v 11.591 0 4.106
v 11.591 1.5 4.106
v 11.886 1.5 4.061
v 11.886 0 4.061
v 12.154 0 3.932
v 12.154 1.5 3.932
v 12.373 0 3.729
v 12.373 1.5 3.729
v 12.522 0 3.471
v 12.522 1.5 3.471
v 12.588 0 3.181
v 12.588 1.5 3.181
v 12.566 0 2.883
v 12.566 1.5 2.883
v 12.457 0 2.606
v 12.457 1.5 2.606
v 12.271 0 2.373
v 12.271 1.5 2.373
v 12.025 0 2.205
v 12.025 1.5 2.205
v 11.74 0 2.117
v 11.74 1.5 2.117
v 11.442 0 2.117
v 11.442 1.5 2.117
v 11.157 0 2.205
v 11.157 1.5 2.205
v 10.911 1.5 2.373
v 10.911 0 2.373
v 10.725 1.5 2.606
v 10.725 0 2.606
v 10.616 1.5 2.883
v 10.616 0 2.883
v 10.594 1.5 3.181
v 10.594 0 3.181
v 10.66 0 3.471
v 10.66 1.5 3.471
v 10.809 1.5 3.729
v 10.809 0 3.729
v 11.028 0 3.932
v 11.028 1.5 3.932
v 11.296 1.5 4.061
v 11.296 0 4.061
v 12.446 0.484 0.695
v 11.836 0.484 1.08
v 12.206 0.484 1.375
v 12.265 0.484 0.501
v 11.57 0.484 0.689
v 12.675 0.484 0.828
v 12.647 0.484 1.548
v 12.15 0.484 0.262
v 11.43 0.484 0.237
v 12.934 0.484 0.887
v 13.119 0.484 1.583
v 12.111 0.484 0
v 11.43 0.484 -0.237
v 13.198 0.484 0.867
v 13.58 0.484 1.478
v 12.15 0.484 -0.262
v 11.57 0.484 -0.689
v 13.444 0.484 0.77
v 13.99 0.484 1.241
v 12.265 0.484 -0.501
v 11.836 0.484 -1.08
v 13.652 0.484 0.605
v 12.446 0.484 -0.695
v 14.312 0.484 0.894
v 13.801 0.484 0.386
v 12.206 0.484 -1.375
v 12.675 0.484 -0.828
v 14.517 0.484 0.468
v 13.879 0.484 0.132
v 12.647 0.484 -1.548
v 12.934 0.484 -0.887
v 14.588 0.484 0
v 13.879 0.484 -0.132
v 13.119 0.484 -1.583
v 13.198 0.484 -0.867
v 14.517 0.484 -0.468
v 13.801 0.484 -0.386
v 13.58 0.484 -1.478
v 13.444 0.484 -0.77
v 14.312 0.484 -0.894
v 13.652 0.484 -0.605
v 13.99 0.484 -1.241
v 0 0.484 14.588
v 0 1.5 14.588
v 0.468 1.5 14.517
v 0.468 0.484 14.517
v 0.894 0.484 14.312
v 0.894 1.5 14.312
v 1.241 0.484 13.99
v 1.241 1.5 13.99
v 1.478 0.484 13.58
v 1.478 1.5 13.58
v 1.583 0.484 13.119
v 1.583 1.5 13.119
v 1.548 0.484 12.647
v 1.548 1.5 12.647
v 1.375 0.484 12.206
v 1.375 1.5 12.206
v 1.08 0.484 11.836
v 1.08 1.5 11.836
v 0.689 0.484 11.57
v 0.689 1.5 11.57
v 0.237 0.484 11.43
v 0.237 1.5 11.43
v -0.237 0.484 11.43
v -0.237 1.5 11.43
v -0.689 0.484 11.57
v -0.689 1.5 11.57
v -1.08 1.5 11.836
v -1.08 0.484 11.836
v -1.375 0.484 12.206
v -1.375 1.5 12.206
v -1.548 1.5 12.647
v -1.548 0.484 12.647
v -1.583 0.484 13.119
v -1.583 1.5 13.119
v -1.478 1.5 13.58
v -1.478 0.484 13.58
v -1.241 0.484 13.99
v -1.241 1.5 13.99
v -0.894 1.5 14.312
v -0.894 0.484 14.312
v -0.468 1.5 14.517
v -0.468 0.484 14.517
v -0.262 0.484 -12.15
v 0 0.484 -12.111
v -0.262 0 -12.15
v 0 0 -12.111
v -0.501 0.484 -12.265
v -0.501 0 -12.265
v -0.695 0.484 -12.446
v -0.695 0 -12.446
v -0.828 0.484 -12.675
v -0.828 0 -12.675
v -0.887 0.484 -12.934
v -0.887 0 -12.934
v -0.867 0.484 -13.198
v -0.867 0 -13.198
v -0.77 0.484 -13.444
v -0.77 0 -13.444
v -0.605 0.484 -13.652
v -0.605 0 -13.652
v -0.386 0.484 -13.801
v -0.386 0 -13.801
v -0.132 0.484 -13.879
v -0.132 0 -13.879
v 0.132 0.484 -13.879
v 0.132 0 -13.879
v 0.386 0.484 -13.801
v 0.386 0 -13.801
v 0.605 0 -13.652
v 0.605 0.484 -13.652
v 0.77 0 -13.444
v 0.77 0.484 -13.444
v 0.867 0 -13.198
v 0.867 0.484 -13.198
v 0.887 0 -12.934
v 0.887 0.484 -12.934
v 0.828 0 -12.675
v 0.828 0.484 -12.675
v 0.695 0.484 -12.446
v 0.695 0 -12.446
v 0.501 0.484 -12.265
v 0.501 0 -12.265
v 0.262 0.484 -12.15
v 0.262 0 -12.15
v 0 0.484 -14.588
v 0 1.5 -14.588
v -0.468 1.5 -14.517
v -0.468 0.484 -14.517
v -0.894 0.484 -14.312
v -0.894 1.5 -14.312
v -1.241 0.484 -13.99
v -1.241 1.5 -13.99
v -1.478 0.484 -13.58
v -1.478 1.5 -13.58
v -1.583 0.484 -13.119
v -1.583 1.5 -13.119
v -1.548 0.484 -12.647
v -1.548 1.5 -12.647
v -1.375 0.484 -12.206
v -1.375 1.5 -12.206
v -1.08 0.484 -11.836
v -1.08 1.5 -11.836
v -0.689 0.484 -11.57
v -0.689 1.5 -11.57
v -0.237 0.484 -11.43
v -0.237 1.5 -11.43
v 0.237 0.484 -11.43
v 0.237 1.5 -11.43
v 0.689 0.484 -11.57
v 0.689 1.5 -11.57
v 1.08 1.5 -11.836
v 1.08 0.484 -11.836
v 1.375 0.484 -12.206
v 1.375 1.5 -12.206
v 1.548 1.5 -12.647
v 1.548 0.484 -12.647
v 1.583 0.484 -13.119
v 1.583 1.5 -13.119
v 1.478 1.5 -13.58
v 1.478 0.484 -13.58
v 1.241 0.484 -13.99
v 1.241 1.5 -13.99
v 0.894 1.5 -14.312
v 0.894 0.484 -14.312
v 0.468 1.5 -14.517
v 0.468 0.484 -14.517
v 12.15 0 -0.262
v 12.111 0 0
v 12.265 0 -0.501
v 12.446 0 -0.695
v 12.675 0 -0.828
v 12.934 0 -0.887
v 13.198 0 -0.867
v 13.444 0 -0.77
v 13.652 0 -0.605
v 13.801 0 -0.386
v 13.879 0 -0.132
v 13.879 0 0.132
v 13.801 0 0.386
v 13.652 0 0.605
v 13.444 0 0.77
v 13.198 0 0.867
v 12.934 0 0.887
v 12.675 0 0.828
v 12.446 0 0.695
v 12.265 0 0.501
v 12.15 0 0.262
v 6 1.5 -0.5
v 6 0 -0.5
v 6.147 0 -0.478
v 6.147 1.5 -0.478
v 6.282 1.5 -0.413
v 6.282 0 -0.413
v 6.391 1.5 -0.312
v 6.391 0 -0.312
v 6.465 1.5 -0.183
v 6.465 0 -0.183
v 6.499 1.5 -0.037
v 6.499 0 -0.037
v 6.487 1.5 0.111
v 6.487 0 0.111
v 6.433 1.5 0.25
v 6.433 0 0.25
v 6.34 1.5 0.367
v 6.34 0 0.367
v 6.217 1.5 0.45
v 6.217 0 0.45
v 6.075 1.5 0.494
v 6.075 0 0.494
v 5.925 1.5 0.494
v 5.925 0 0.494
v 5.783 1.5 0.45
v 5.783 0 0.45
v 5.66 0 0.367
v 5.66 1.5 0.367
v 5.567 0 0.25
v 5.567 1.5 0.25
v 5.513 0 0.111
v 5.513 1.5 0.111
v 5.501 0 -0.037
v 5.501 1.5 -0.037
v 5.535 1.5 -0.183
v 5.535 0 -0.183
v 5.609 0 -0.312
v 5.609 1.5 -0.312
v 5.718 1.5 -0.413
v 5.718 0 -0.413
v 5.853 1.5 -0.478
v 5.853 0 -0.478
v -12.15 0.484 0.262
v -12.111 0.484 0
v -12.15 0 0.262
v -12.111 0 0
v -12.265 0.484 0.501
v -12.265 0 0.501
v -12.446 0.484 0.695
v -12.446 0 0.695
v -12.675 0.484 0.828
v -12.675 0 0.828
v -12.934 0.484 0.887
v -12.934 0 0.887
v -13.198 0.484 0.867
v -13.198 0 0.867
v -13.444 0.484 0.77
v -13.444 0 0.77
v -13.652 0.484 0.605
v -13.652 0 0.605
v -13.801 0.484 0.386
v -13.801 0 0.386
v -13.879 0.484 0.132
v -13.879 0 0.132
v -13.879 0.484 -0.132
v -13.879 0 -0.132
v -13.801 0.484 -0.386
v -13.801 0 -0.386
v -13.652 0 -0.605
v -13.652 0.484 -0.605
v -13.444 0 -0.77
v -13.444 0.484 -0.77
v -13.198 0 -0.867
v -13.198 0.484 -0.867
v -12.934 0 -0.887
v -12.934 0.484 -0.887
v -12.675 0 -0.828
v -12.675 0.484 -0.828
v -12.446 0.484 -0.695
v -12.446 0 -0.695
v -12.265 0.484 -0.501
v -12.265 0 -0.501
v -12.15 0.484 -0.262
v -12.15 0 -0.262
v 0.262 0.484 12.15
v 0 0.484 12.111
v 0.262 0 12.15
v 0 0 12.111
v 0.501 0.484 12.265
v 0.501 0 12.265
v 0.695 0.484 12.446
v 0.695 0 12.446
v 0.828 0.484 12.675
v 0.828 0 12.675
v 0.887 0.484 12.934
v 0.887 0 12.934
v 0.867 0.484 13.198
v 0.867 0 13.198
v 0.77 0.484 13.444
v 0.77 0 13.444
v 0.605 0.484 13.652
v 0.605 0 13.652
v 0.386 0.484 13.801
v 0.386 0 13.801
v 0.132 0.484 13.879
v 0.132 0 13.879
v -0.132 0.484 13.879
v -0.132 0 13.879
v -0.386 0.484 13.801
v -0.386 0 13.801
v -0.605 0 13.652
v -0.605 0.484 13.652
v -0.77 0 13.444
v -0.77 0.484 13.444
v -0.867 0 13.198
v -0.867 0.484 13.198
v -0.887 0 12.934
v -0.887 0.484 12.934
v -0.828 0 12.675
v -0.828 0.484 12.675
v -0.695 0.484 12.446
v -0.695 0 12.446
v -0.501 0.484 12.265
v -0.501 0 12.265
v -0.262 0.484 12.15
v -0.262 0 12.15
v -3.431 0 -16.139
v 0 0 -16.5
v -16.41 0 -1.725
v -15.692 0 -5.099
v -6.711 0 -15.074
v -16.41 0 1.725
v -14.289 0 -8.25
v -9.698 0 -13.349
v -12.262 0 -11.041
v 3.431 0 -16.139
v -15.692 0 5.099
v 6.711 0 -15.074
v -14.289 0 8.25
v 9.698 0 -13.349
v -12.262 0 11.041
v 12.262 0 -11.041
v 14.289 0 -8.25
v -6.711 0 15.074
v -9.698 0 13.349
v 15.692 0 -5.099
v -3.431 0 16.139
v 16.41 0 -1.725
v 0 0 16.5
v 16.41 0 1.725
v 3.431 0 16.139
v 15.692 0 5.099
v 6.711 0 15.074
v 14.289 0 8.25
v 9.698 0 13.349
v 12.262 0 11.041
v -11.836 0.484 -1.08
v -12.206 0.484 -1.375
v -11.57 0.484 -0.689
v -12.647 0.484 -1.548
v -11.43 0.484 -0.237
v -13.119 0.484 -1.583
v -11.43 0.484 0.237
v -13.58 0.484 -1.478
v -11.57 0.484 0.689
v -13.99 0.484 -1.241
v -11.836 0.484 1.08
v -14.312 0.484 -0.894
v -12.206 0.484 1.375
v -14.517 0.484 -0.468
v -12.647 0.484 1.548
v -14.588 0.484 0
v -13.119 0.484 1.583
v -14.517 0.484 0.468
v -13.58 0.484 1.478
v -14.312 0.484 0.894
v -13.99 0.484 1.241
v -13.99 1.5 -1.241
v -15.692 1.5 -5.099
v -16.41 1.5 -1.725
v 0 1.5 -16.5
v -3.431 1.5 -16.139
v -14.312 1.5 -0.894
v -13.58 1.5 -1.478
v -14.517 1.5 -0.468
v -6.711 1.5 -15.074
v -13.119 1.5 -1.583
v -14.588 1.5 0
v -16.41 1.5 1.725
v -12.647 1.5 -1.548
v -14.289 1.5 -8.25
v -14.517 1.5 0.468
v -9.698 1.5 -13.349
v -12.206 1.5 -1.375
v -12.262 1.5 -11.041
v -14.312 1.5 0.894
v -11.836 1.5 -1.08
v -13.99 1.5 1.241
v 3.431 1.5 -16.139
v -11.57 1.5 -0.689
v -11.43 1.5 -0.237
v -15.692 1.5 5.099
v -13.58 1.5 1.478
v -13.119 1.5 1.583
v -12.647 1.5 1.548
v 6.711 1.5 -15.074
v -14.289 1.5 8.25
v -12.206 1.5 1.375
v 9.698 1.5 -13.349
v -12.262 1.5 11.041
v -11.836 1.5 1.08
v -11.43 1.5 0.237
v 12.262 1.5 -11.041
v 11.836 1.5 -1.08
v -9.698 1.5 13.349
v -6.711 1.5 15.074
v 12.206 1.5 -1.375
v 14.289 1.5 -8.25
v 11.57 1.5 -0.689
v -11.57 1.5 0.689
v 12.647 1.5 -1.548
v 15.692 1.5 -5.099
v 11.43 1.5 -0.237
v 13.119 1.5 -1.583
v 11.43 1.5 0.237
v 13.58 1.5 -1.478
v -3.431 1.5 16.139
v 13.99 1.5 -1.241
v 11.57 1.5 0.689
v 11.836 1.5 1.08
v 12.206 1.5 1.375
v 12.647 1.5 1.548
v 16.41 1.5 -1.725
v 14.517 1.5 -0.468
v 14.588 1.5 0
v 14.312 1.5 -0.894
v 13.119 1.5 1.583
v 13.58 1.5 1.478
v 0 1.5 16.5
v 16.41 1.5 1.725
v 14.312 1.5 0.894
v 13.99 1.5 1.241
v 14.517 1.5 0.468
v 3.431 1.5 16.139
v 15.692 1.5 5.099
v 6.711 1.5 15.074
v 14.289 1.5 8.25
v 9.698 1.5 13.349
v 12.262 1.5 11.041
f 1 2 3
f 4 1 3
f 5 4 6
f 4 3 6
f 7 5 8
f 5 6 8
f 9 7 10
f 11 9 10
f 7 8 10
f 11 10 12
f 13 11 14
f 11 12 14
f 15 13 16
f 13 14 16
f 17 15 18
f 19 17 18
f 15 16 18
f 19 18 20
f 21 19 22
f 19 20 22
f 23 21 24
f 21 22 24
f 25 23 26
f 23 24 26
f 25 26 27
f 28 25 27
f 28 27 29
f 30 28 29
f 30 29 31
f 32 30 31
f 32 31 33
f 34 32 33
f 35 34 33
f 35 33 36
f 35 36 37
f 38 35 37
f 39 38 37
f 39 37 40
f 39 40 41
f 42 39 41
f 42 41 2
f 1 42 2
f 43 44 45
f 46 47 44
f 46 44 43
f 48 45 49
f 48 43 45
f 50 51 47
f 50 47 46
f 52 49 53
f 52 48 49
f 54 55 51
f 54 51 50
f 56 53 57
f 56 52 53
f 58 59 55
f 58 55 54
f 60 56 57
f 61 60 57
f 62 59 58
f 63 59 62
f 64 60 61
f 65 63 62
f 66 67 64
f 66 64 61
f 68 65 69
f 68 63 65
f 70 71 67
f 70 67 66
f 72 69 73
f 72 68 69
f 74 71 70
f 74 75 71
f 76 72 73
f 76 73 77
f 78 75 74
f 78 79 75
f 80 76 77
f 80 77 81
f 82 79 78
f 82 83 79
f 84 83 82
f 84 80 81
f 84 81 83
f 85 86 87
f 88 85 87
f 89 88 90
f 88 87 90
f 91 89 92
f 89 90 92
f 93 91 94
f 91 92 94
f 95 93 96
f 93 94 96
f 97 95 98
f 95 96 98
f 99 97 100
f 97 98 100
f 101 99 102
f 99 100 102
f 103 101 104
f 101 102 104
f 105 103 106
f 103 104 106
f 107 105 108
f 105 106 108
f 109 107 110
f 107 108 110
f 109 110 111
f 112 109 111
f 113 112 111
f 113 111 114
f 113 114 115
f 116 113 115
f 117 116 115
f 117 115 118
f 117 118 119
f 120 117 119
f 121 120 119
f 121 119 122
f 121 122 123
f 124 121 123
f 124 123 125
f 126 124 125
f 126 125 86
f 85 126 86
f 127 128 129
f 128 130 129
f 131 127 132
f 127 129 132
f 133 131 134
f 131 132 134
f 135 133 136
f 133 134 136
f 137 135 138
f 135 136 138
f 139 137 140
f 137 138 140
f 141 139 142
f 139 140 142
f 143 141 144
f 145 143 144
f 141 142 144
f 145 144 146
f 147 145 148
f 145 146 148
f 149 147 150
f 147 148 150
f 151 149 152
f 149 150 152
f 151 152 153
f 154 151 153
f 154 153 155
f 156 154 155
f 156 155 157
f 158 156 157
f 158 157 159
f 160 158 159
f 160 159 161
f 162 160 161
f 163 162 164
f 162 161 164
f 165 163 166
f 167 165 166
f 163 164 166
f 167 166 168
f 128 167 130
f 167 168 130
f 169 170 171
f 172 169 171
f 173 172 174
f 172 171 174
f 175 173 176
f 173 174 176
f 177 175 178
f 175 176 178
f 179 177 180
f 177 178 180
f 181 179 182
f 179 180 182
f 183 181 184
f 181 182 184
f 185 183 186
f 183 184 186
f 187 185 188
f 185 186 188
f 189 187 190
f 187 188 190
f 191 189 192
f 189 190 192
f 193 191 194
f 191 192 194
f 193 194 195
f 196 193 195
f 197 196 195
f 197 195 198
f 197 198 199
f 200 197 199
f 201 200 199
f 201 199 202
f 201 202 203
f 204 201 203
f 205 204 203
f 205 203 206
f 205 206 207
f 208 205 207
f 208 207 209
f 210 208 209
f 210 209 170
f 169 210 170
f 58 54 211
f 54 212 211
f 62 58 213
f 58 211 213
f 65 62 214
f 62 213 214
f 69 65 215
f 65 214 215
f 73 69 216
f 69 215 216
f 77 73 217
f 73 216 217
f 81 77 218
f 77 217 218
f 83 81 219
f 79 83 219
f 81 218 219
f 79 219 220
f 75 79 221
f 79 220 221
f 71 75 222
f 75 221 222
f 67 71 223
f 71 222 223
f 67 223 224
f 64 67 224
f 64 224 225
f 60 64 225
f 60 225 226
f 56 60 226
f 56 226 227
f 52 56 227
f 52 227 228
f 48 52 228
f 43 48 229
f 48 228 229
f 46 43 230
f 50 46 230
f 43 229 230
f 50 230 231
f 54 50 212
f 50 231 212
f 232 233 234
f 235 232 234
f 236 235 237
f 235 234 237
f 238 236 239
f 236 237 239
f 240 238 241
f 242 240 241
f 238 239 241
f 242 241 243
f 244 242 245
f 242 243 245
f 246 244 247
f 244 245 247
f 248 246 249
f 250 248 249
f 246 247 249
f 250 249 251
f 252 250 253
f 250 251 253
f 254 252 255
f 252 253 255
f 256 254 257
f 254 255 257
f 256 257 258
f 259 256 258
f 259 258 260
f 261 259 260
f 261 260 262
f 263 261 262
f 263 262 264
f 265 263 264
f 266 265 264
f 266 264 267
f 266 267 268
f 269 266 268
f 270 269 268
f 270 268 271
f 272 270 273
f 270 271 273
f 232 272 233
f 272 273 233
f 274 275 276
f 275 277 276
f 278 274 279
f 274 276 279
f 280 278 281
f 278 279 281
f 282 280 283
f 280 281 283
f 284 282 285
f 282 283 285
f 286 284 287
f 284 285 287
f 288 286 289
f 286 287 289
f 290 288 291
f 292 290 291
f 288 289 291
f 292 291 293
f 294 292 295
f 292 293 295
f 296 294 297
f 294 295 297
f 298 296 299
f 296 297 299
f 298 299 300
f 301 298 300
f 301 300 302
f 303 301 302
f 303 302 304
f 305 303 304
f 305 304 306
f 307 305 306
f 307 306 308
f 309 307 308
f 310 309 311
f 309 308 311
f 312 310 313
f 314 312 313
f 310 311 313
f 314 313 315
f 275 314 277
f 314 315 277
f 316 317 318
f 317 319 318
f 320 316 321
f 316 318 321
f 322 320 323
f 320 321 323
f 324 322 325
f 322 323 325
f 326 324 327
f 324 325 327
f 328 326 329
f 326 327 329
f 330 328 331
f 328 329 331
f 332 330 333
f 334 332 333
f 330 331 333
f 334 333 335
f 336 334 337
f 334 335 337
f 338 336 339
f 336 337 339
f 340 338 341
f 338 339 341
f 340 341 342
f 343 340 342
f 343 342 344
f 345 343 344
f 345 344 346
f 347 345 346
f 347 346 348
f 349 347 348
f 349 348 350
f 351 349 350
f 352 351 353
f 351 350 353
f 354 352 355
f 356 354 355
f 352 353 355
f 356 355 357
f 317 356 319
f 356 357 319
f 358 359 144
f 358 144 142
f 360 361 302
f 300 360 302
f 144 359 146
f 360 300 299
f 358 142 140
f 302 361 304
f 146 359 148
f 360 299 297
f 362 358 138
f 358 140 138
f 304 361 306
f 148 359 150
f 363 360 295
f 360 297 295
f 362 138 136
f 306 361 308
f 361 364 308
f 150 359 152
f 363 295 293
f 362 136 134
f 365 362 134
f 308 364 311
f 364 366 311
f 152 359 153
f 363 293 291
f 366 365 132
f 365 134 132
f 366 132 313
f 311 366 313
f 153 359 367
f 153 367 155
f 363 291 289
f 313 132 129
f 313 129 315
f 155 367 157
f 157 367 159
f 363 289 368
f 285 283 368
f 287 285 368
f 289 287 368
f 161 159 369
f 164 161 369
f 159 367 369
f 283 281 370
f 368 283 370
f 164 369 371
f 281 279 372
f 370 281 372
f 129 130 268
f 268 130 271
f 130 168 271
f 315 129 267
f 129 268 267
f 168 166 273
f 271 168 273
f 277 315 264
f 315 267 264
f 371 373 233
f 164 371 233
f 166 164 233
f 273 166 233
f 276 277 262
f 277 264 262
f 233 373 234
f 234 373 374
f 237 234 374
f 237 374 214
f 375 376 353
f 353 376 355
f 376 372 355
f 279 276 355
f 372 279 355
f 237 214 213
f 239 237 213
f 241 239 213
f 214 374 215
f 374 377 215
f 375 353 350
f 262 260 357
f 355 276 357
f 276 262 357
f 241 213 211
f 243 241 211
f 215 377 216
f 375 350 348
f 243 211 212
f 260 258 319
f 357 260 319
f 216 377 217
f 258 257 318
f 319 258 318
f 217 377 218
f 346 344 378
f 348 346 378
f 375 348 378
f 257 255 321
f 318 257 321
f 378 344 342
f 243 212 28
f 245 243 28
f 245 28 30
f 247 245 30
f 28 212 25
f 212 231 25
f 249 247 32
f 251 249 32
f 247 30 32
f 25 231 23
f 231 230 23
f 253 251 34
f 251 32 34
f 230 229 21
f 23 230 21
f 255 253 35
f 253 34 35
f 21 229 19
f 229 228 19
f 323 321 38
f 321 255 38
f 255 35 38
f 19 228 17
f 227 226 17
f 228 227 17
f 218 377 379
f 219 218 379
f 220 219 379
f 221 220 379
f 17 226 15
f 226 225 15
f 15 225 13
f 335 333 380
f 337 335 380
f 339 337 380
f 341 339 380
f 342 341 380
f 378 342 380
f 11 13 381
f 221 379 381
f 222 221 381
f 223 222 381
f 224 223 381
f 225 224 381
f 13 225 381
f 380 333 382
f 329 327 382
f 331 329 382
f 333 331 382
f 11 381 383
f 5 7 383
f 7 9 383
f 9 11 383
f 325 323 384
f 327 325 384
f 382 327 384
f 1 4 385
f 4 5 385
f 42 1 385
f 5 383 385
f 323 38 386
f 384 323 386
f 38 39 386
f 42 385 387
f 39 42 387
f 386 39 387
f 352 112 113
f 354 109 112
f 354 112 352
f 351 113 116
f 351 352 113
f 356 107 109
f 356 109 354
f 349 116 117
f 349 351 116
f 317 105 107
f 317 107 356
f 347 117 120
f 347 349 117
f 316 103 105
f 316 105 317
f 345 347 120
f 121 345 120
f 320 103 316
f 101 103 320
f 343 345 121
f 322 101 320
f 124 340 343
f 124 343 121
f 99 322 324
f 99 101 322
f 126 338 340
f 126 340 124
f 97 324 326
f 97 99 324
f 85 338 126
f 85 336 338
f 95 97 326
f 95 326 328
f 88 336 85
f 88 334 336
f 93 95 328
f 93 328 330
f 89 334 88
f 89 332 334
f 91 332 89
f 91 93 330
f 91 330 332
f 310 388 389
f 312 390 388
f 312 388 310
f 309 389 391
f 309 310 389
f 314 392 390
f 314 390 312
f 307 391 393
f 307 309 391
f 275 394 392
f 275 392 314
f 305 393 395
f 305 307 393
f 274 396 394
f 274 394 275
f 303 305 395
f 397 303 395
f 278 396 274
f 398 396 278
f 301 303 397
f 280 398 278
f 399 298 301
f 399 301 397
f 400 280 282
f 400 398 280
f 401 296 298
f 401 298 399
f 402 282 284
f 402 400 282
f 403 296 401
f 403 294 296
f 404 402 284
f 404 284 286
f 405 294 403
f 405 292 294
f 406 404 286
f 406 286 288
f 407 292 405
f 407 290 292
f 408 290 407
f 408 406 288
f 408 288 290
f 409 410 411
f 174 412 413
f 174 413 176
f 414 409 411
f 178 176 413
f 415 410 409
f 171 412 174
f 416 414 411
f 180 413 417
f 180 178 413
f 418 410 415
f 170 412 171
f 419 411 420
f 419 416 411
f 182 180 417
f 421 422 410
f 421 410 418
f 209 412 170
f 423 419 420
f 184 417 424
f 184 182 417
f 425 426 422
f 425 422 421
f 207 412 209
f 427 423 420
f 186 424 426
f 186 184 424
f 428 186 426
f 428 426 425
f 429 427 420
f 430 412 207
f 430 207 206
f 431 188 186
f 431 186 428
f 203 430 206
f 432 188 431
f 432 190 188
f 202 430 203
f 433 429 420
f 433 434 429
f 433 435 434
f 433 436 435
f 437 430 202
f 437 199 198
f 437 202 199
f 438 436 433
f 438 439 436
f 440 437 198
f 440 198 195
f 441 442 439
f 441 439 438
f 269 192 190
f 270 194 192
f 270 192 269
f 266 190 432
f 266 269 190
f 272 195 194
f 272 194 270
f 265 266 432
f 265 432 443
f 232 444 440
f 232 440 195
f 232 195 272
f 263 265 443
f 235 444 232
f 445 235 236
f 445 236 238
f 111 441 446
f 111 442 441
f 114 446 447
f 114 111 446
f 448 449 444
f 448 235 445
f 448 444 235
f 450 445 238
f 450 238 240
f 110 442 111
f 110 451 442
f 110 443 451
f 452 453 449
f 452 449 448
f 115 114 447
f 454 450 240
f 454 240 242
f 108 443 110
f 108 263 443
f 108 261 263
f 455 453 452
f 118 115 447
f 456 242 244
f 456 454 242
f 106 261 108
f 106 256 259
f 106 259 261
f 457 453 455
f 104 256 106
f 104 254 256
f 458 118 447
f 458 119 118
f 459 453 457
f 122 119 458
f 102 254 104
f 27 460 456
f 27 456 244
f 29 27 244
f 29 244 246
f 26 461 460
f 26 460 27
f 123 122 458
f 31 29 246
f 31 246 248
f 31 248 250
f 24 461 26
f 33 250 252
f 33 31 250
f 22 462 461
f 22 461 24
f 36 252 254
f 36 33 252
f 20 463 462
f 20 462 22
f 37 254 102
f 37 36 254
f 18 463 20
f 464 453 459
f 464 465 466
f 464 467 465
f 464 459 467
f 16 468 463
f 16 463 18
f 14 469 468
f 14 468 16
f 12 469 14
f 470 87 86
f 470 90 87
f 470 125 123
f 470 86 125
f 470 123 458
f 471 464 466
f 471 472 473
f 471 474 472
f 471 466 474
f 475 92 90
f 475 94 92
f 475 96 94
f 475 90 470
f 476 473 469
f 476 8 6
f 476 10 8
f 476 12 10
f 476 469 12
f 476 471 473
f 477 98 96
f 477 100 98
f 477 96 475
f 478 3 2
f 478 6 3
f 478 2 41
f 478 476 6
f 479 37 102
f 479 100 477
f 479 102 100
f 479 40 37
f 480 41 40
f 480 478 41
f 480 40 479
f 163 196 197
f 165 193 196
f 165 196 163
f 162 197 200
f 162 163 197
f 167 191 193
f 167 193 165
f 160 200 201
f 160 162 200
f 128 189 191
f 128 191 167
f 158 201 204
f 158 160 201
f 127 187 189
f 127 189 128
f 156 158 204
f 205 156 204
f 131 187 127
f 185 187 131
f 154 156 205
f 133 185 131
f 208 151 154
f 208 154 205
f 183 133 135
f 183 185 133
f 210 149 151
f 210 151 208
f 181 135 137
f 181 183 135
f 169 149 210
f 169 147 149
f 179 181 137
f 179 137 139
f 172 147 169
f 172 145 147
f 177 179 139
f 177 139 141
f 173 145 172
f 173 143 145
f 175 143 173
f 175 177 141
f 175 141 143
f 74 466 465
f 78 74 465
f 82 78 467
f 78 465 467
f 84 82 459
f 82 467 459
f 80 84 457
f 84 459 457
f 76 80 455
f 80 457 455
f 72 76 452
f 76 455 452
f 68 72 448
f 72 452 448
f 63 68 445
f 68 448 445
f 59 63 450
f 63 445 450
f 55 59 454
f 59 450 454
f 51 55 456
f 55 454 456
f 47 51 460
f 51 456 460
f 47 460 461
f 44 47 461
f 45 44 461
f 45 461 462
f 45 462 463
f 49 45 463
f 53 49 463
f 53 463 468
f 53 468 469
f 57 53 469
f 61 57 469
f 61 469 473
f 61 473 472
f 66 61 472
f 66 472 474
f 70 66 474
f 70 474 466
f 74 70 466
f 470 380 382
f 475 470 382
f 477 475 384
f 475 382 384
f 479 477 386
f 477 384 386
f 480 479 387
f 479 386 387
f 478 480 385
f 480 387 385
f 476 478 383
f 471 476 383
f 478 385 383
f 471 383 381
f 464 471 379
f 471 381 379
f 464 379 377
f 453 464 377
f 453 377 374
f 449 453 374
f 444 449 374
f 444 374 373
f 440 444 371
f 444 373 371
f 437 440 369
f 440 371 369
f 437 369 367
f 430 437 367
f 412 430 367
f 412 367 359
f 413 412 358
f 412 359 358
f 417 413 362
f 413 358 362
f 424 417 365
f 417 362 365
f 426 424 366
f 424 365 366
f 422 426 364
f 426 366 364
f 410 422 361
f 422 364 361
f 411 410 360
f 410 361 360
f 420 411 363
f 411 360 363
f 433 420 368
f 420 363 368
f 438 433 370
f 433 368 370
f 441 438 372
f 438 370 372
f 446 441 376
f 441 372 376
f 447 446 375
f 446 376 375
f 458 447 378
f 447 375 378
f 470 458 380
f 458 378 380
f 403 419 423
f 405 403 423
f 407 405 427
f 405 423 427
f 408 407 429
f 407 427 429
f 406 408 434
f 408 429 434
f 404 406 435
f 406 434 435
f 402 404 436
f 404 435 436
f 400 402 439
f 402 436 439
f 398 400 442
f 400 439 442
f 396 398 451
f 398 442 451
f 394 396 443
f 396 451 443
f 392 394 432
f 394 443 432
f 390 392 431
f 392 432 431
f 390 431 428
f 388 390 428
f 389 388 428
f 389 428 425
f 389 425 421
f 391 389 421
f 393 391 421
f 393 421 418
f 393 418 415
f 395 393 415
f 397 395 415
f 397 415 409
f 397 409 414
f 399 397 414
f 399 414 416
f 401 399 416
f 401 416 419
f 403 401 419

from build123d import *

# Parameters (mm, degrees)
SKETCH1_R                                      = 16.5
BOSS_EXTRUDE1_DEPTH                            = 1.5
CBORE_FOR_0_SOCKET_HEAD_CAP_SCREW1_D           = 1.778
CBORE_FOR_0_SOCKET_HEAD_CAP_SCREW1_CBORE_D     = 3.175
CBORE_FOR_0_SOCKET_HEAD_CAP_SCREW1_CBORE_DEPTH = 1.016
CIRPATTERN1_COUNT                              = 4
SKETCH8_R                                      = 0.5
CUT_EXTRUDE1_DEPTH                             = 1.5
SKETCH9_R                                      = 1
CUT_EXTRUDE2_DEPTH                             = 10


with BuildPart() as part:
    # Sketch1 → Boss-Extrude1 (new body)
    with BuildSketch(Plane(origin=(0, 0, 0), x_dir=(1, 0, 0), z_dir=(0, 1, 0))):
        with Locations(Location((0, 0, 0), (0, 0, 270))):
            Circle(SKETCH1_R)
    extrude(amount=BOSS_EXTRUDE1_DEPTH)

    # CBORE for #0 Socket Head Cap Screw1 (through all)
    with Locations(Plane(origin=(0, 1.5, 0), x_dir=(1, 0, 0), z_dir=(0, 1, 0))):
        with Locations((13, 0)):
            cbore_for_0_socket_head_cap_screw1 = CounterBoreHole(CBORE_FOR_0_SOCKET_HEAD_CAP_SCREW1_D / 2, CBORE_FOR_0_SOCKET_HEAD_CAP_SCREW1_CBORE_D / 2, CBORE_FOR_0_SOCKET_HEAD_CAP_SCREW1_CBORE_DEPTH)

    # CirPattern1: CBORE for #0 Socket Head Cap Screw1 ×4 about axis
    cirpattern1_axis = Axis((0, 0, 0), (0, 1, 0))
    for i in range(1, CIRPATTERN1_COUNT):
        add(cbore_for_0_socket_head_cap_screw1.rotate(cirpattern1_axis, i * 360 / CIRPATTERN1_COUNT), mode=Mode.SUBTRACT)

    # Sketch8 → Cut-Extrude1 (cut)
    with BuildSketch(Plane.XZ):
        with Locations(Location((6, 0, 0), (0, 0, 270))):
            Circle(SKETCH8_R)
    extrude(amount=-CUT_EXTRUDE1_DEPTH, mode=Mode.SUBTRACT)

    # Sketch9 → Cut-Extrude2 (cut)
    with BuildSketch(Plane(origin=(0, 1.5, 0), x_dir=(1, 0, 0), z_dir=(0, 1, 0))):
        with Locations(Location((11.591109915, -3.105828541, 0), (0, 0, 270))):
            Circle(SKETCH9_R)
    extrude(amount=-CUT_EXTRUDE2_DEPTH, mode=Mode.SUBTRACT)


solid = part.part
